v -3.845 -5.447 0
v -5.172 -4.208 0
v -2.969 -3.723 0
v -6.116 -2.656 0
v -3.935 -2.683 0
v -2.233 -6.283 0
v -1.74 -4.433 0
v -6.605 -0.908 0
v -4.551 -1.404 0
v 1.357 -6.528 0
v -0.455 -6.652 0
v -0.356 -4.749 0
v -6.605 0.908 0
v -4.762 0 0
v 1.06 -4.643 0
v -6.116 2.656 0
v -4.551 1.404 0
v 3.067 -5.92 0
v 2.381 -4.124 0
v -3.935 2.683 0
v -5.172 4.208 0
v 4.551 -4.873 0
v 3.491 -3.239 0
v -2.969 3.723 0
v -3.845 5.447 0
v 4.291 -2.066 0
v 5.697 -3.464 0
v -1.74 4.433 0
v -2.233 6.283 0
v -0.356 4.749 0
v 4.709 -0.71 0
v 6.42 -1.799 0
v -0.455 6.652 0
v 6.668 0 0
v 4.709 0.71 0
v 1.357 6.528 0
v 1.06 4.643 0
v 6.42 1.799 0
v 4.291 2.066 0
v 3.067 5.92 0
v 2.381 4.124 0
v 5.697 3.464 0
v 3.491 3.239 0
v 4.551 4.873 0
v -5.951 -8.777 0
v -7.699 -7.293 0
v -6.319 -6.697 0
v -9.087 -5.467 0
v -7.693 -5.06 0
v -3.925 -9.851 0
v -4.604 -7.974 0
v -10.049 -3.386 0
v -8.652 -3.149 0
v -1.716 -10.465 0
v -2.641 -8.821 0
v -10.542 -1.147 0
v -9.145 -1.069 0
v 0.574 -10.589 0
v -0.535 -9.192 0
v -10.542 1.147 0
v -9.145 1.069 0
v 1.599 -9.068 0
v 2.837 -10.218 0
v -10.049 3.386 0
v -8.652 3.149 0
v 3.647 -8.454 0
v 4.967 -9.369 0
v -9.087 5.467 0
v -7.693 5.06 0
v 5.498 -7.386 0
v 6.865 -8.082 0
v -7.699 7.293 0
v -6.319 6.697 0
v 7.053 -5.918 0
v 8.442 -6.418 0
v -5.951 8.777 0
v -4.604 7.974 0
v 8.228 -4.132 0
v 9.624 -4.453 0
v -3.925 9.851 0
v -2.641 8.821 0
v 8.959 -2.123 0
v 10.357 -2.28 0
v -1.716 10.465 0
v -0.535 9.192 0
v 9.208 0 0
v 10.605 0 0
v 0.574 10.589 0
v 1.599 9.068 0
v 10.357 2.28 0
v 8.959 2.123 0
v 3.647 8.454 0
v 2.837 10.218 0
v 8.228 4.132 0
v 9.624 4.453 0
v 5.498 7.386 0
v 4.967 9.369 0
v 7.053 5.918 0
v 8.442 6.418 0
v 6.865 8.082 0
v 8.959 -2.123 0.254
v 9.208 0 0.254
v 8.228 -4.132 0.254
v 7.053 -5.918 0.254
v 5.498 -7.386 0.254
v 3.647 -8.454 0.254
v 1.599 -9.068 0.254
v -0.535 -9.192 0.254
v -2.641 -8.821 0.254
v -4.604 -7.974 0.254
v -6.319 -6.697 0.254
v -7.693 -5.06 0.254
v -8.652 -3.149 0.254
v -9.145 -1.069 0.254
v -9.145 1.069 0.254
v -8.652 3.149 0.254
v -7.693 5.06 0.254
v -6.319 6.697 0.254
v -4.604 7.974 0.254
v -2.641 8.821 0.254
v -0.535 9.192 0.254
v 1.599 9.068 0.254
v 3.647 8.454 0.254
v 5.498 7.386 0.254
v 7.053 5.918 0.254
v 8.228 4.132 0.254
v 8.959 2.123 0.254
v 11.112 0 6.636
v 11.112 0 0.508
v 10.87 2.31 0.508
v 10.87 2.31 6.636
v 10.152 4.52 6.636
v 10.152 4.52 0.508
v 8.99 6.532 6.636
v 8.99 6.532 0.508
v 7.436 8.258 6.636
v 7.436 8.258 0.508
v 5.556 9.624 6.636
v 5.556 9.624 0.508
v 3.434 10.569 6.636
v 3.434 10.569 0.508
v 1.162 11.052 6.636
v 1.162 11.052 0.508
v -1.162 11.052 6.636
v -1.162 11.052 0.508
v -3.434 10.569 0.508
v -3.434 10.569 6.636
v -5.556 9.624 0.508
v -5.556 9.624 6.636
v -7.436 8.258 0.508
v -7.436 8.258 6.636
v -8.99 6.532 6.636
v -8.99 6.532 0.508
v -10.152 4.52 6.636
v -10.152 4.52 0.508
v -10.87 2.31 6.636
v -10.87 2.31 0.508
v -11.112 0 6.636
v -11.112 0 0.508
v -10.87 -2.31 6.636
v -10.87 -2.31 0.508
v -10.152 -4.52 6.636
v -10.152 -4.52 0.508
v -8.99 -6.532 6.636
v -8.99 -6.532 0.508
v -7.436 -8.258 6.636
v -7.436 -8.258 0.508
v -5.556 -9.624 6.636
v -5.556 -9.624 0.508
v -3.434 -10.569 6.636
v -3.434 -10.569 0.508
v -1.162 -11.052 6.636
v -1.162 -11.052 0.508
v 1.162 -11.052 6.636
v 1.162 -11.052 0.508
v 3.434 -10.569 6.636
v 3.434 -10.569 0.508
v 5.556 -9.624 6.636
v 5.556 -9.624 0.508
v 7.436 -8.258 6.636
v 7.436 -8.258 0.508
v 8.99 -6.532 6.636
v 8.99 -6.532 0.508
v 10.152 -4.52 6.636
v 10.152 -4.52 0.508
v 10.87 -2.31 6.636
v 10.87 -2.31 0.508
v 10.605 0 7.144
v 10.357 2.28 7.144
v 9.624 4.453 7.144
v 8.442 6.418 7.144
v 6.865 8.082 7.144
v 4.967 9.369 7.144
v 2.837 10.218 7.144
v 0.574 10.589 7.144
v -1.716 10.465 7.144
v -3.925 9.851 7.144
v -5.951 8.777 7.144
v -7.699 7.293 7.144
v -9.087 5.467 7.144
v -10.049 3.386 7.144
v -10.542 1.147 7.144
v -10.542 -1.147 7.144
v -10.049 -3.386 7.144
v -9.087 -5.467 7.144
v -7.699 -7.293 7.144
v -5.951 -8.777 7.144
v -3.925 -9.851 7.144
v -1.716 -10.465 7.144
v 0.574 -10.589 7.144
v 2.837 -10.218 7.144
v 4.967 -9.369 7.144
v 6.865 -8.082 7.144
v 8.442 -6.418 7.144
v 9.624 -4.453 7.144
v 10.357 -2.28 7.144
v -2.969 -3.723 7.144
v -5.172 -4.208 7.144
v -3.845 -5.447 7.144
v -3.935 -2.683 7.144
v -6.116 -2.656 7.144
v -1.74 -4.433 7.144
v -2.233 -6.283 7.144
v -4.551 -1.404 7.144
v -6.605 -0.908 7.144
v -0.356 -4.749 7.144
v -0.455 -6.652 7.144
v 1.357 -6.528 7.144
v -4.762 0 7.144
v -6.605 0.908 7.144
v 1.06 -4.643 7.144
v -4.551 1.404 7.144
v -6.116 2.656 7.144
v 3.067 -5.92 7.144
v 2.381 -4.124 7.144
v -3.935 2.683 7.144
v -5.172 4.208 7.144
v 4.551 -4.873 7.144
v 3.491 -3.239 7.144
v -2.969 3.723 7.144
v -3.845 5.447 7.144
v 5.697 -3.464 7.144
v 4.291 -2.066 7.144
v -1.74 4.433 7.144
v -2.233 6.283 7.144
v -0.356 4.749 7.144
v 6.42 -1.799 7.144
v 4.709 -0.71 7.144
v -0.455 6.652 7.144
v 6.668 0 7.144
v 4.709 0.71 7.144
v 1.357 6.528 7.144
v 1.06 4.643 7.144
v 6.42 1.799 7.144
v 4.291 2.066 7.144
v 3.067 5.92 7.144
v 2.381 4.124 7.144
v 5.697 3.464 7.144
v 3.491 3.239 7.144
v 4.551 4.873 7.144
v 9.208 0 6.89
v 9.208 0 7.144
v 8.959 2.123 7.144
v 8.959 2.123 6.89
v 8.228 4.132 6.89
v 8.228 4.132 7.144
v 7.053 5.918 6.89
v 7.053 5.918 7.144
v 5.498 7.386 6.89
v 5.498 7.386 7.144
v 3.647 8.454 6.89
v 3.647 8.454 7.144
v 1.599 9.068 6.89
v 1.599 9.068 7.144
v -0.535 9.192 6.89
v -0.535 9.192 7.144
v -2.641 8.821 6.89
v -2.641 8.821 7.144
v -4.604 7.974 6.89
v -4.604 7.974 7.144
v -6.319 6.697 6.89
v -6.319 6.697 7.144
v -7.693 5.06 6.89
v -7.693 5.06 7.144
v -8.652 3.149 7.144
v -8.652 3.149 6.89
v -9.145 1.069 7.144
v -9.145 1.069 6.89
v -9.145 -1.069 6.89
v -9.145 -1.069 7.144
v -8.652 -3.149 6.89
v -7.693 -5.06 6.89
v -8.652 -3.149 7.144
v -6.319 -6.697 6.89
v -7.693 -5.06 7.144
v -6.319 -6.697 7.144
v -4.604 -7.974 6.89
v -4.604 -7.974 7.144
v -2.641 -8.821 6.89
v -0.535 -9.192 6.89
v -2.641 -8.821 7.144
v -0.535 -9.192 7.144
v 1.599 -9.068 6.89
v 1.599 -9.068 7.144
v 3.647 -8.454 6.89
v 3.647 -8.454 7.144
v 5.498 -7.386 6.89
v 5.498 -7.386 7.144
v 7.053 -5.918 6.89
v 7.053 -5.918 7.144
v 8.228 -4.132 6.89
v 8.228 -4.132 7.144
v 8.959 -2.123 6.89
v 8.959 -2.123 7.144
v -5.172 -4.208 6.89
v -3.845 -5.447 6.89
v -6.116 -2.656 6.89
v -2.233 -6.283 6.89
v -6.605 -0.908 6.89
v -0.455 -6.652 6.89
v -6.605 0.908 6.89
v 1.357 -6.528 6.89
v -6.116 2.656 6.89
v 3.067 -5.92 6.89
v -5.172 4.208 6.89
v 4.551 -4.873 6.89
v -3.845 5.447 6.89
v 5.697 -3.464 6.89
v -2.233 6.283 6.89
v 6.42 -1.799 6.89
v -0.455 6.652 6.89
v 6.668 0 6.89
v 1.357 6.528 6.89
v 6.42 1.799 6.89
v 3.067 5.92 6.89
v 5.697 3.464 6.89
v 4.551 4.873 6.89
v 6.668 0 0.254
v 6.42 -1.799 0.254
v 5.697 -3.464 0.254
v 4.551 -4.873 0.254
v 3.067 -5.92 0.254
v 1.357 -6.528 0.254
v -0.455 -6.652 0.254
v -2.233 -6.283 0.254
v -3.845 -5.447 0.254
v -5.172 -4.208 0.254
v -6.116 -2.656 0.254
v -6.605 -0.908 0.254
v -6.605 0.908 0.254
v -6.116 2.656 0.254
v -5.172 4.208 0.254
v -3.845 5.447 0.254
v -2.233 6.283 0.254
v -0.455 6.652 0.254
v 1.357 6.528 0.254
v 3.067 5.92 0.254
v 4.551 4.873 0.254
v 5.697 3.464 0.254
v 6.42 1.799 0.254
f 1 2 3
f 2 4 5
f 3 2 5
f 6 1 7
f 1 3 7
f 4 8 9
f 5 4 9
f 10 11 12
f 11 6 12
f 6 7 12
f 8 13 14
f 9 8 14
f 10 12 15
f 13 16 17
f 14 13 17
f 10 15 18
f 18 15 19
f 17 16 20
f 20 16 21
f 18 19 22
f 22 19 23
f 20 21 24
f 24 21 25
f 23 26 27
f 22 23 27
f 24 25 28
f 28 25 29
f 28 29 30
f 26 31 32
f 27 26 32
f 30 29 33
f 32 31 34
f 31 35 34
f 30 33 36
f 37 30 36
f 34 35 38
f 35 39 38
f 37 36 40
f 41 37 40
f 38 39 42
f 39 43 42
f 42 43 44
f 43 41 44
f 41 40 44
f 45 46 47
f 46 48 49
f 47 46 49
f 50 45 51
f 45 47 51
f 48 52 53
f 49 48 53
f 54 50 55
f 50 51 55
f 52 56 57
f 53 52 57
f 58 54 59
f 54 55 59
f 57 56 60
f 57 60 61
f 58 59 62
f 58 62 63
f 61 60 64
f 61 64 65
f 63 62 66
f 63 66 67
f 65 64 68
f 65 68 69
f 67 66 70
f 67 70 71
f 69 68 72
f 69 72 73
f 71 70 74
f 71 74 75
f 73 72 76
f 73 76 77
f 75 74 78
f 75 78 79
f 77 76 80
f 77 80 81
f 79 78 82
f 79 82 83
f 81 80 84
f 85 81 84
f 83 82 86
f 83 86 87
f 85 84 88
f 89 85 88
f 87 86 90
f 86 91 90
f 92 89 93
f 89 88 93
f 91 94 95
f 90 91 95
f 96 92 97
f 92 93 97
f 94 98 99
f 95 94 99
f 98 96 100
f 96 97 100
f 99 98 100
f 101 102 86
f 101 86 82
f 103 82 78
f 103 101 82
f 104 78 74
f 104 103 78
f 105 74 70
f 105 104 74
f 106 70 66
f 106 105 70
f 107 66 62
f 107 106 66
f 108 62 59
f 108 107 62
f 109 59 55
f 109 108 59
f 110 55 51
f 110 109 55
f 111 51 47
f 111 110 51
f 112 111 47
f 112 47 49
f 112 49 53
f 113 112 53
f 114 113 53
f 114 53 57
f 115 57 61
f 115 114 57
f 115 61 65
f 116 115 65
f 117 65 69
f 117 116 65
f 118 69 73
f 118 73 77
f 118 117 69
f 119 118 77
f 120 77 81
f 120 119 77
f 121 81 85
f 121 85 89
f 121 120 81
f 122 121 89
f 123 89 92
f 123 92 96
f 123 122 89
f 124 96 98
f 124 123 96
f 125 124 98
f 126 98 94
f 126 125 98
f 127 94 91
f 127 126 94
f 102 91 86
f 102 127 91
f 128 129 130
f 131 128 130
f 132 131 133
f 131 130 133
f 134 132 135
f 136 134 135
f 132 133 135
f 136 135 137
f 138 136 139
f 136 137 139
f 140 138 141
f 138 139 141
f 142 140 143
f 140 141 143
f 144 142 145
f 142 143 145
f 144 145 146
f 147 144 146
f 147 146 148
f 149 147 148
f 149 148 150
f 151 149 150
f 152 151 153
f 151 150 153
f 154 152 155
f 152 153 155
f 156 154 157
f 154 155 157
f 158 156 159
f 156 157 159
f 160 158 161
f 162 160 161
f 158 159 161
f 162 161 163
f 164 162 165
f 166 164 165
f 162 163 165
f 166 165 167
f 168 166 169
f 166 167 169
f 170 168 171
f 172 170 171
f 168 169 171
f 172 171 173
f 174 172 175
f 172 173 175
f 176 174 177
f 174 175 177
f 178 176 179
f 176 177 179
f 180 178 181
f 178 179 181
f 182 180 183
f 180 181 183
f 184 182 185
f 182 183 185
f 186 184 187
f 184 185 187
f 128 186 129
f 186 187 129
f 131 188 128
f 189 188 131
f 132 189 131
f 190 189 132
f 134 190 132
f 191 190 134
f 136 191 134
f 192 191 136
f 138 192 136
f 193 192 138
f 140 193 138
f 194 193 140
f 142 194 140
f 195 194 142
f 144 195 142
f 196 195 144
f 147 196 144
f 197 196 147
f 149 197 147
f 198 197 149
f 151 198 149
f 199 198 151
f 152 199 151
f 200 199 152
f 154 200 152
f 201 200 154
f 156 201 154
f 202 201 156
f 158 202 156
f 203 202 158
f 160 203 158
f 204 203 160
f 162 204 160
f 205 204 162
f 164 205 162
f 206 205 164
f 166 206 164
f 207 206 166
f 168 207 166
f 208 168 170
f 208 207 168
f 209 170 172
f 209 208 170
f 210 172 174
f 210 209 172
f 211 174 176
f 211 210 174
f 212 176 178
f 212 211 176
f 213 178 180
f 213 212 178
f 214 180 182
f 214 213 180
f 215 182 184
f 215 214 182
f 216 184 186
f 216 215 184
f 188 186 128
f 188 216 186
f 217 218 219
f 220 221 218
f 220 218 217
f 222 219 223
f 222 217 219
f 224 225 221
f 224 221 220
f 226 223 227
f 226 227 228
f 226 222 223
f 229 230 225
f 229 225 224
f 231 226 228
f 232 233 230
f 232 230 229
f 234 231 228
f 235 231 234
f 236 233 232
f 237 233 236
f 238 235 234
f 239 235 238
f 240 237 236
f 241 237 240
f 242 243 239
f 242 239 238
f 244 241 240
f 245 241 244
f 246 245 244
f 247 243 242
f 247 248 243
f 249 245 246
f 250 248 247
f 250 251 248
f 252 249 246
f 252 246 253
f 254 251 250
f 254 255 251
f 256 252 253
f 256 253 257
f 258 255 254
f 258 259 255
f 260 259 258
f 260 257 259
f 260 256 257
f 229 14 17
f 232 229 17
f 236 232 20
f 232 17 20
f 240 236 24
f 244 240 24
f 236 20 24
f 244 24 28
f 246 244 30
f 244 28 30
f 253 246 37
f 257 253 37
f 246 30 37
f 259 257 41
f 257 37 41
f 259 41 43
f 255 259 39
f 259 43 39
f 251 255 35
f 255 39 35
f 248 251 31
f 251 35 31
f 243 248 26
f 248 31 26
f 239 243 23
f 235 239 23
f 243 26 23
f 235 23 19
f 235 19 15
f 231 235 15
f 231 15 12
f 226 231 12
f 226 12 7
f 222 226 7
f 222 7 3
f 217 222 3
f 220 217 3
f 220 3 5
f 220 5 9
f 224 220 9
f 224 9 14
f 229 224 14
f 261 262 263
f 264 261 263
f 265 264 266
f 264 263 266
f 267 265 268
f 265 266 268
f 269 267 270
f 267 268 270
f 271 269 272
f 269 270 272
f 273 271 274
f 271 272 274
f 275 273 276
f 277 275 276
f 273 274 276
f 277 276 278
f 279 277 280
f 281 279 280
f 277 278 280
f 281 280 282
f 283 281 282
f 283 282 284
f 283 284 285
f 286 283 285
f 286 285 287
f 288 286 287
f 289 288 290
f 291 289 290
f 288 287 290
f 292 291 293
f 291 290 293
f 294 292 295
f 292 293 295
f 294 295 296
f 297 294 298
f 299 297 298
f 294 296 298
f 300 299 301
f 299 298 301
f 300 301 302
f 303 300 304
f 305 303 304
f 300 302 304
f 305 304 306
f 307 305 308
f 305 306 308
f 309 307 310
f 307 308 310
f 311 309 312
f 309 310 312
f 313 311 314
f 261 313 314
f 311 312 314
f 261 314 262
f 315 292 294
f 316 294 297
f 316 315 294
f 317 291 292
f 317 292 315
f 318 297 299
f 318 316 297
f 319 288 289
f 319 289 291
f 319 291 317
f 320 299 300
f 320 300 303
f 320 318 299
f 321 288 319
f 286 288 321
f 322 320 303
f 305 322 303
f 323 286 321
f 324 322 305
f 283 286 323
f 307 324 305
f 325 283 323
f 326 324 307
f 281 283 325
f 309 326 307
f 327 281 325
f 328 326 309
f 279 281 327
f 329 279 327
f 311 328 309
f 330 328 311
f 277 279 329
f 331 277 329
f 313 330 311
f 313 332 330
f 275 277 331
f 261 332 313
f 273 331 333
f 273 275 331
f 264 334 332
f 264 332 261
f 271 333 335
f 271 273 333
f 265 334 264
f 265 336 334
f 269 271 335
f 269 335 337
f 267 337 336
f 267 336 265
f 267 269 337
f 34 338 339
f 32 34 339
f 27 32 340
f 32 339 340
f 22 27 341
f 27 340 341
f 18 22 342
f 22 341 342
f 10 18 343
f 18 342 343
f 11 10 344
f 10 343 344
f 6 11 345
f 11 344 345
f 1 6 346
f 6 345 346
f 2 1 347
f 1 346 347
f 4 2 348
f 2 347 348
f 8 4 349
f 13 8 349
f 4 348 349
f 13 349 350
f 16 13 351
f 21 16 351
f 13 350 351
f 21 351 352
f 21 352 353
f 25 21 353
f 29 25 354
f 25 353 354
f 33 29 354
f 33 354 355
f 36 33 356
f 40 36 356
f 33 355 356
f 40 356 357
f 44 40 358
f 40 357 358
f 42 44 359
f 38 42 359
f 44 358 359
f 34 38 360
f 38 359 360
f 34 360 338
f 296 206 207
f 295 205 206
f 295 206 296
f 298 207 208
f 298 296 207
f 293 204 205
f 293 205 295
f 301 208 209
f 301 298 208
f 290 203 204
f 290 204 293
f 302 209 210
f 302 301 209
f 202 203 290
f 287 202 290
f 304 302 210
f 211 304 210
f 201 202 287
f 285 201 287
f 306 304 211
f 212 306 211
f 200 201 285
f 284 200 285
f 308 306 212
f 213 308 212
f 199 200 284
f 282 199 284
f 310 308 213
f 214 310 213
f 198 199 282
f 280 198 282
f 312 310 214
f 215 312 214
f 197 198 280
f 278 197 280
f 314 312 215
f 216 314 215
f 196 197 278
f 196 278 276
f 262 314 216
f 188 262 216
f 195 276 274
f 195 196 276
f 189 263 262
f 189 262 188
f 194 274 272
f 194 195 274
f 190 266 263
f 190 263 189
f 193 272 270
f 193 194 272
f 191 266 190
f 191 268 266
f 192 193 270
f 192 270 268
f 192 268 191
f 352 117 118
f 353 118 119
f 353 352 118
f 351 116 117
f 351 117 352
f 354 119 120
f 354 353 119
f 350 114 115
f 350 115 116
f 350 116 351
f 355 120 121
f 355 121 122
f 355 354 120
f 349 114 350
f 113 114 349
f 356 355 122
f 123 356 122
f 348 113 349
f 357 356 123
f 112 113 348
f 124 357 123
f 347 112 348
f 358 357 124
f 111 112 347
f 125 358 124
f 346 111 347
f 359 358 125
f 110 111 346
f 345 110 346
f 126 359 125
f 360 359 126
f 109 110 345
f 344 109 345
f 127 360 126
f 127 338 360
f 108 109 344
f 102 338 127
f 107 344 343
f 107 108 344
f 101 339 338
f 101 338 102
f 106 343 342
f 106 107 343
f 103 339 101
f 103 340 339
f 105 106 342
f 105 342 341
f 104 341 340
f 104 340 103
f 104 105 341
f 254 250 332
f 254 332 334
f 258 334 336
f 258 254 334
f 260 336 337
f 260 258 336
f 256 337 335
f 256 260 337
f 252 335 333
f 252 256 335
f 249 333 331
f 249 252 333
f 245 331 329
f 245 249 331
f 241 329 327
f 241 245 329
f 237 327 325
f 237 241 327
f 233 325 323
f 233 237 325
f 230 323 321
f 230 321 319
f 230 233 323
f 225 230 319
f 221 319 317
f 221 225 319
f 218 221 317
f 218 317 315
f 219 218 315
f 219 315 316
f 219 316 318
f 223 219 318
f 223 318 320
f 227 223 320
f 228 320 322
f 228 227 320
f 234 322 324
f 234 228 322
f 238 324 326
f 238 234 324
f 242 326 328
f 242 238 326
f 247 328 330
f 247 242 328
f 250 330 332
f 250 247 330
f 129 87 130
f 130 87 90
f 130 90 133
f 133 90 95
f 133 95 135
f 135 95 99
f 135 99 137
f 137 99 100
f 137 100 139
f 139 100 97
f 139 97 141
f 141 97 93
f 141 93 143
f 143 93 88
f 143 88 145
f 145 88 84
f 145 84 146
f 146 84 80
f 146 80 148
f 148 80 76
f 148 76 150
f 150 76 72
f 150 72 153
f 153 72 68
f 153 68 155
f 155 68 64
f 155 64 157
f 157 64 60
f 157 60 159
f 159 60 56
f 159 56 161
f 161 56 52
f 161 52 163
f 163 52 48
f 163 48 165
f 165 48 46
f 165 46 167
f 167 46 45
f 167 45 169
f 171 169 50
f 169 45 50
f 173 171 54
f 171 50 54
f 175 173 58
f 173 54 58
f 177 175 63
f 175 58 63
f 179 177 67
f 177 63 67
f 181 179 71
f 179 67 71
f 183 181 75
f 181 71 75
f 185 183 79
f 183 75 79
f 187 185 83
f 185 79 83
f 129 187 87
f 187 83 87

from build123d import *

# Parameters (mm, degrees)
SKETCH1_R                    = 11.1125
BOSS_EXTRUDE1_DEPTH          = 7.14375
CHAMFER1_SIZE                = 0.508
F_3_8_0_375_DIAMETER_HOLE1_D = 9.525
SKETCH5_R                    = 9.2075
SKETCH5_R_2                  = 6.6675
CUT_EXTRUDE1_DEPTH           = 0.254
CUT_EXTRUDE2_START           = -0.254
SKETCH6_R                    = 9.2075
SKETCH6_R_2                  = 6.6675
CUT_EXTRUDE2_DEPTH           = 0.254


with BuildPart() as part:
    # Sketch1 → Boss-Extrude1 (new body)
    with BuildSketch(Plane.XY):
        Circle(SKETCH1_R)
    extrude(amount=BOSS_EXTRUDE1_DEPTH)

    # Chamfer1
    chamfer1_edges = [part.edges().sort_by_distance(p)[0] for p in [
        (-11.1125, 0, 0),
        (-11.1125, 0, 7.14375),
    ]]
    chamfer(chamfer1_edges, length=CHAMFER1_SIZE)

    # 3/8 (0.375) Diameter Hole1 (through all)
    with Locations(Plane.XY.offset(7.14375)):
        with Locations((0, 0)):
            Hole(F_3_8_0_375_DIAMETER_HOLE1_D / 2)

    # Sketch5 → Cut-Extrude1 (cut)
    with BuildSketch(Plane.XY.offset(7.14375)):
        Circle(SKETCH5_R)
        Circle(SKETCH5_R_2, mode=Mode.SUBTRACT)
    extrude(amount=-CUT_EXTRUDE1_DEPTH, mode=Mode.SUBTRACT)

    # Sketch6 → Cut-Extrude2 (cut)
    with BuildSketch(Plane(origin=(0, 0, 0), x_dir=(-1, 0, 0), z_dir=(0, 0, -1)).offset(CUT_EXTRUDE2_START)):
        with Locations(Location((0, 0, 0), (0, 0, 180))):
            Circle(SKETCH6_R)
        with Locations(Location((0, 0, 0), (0, 0, 180))):
            Circle(SKETCH6_R_2, mode=Mode.SUBTRACT)
    extrude(amount=CUT_EXTRUDE2_DEPTH, mode=Mode.SUBTRACT)


solid = part.part
